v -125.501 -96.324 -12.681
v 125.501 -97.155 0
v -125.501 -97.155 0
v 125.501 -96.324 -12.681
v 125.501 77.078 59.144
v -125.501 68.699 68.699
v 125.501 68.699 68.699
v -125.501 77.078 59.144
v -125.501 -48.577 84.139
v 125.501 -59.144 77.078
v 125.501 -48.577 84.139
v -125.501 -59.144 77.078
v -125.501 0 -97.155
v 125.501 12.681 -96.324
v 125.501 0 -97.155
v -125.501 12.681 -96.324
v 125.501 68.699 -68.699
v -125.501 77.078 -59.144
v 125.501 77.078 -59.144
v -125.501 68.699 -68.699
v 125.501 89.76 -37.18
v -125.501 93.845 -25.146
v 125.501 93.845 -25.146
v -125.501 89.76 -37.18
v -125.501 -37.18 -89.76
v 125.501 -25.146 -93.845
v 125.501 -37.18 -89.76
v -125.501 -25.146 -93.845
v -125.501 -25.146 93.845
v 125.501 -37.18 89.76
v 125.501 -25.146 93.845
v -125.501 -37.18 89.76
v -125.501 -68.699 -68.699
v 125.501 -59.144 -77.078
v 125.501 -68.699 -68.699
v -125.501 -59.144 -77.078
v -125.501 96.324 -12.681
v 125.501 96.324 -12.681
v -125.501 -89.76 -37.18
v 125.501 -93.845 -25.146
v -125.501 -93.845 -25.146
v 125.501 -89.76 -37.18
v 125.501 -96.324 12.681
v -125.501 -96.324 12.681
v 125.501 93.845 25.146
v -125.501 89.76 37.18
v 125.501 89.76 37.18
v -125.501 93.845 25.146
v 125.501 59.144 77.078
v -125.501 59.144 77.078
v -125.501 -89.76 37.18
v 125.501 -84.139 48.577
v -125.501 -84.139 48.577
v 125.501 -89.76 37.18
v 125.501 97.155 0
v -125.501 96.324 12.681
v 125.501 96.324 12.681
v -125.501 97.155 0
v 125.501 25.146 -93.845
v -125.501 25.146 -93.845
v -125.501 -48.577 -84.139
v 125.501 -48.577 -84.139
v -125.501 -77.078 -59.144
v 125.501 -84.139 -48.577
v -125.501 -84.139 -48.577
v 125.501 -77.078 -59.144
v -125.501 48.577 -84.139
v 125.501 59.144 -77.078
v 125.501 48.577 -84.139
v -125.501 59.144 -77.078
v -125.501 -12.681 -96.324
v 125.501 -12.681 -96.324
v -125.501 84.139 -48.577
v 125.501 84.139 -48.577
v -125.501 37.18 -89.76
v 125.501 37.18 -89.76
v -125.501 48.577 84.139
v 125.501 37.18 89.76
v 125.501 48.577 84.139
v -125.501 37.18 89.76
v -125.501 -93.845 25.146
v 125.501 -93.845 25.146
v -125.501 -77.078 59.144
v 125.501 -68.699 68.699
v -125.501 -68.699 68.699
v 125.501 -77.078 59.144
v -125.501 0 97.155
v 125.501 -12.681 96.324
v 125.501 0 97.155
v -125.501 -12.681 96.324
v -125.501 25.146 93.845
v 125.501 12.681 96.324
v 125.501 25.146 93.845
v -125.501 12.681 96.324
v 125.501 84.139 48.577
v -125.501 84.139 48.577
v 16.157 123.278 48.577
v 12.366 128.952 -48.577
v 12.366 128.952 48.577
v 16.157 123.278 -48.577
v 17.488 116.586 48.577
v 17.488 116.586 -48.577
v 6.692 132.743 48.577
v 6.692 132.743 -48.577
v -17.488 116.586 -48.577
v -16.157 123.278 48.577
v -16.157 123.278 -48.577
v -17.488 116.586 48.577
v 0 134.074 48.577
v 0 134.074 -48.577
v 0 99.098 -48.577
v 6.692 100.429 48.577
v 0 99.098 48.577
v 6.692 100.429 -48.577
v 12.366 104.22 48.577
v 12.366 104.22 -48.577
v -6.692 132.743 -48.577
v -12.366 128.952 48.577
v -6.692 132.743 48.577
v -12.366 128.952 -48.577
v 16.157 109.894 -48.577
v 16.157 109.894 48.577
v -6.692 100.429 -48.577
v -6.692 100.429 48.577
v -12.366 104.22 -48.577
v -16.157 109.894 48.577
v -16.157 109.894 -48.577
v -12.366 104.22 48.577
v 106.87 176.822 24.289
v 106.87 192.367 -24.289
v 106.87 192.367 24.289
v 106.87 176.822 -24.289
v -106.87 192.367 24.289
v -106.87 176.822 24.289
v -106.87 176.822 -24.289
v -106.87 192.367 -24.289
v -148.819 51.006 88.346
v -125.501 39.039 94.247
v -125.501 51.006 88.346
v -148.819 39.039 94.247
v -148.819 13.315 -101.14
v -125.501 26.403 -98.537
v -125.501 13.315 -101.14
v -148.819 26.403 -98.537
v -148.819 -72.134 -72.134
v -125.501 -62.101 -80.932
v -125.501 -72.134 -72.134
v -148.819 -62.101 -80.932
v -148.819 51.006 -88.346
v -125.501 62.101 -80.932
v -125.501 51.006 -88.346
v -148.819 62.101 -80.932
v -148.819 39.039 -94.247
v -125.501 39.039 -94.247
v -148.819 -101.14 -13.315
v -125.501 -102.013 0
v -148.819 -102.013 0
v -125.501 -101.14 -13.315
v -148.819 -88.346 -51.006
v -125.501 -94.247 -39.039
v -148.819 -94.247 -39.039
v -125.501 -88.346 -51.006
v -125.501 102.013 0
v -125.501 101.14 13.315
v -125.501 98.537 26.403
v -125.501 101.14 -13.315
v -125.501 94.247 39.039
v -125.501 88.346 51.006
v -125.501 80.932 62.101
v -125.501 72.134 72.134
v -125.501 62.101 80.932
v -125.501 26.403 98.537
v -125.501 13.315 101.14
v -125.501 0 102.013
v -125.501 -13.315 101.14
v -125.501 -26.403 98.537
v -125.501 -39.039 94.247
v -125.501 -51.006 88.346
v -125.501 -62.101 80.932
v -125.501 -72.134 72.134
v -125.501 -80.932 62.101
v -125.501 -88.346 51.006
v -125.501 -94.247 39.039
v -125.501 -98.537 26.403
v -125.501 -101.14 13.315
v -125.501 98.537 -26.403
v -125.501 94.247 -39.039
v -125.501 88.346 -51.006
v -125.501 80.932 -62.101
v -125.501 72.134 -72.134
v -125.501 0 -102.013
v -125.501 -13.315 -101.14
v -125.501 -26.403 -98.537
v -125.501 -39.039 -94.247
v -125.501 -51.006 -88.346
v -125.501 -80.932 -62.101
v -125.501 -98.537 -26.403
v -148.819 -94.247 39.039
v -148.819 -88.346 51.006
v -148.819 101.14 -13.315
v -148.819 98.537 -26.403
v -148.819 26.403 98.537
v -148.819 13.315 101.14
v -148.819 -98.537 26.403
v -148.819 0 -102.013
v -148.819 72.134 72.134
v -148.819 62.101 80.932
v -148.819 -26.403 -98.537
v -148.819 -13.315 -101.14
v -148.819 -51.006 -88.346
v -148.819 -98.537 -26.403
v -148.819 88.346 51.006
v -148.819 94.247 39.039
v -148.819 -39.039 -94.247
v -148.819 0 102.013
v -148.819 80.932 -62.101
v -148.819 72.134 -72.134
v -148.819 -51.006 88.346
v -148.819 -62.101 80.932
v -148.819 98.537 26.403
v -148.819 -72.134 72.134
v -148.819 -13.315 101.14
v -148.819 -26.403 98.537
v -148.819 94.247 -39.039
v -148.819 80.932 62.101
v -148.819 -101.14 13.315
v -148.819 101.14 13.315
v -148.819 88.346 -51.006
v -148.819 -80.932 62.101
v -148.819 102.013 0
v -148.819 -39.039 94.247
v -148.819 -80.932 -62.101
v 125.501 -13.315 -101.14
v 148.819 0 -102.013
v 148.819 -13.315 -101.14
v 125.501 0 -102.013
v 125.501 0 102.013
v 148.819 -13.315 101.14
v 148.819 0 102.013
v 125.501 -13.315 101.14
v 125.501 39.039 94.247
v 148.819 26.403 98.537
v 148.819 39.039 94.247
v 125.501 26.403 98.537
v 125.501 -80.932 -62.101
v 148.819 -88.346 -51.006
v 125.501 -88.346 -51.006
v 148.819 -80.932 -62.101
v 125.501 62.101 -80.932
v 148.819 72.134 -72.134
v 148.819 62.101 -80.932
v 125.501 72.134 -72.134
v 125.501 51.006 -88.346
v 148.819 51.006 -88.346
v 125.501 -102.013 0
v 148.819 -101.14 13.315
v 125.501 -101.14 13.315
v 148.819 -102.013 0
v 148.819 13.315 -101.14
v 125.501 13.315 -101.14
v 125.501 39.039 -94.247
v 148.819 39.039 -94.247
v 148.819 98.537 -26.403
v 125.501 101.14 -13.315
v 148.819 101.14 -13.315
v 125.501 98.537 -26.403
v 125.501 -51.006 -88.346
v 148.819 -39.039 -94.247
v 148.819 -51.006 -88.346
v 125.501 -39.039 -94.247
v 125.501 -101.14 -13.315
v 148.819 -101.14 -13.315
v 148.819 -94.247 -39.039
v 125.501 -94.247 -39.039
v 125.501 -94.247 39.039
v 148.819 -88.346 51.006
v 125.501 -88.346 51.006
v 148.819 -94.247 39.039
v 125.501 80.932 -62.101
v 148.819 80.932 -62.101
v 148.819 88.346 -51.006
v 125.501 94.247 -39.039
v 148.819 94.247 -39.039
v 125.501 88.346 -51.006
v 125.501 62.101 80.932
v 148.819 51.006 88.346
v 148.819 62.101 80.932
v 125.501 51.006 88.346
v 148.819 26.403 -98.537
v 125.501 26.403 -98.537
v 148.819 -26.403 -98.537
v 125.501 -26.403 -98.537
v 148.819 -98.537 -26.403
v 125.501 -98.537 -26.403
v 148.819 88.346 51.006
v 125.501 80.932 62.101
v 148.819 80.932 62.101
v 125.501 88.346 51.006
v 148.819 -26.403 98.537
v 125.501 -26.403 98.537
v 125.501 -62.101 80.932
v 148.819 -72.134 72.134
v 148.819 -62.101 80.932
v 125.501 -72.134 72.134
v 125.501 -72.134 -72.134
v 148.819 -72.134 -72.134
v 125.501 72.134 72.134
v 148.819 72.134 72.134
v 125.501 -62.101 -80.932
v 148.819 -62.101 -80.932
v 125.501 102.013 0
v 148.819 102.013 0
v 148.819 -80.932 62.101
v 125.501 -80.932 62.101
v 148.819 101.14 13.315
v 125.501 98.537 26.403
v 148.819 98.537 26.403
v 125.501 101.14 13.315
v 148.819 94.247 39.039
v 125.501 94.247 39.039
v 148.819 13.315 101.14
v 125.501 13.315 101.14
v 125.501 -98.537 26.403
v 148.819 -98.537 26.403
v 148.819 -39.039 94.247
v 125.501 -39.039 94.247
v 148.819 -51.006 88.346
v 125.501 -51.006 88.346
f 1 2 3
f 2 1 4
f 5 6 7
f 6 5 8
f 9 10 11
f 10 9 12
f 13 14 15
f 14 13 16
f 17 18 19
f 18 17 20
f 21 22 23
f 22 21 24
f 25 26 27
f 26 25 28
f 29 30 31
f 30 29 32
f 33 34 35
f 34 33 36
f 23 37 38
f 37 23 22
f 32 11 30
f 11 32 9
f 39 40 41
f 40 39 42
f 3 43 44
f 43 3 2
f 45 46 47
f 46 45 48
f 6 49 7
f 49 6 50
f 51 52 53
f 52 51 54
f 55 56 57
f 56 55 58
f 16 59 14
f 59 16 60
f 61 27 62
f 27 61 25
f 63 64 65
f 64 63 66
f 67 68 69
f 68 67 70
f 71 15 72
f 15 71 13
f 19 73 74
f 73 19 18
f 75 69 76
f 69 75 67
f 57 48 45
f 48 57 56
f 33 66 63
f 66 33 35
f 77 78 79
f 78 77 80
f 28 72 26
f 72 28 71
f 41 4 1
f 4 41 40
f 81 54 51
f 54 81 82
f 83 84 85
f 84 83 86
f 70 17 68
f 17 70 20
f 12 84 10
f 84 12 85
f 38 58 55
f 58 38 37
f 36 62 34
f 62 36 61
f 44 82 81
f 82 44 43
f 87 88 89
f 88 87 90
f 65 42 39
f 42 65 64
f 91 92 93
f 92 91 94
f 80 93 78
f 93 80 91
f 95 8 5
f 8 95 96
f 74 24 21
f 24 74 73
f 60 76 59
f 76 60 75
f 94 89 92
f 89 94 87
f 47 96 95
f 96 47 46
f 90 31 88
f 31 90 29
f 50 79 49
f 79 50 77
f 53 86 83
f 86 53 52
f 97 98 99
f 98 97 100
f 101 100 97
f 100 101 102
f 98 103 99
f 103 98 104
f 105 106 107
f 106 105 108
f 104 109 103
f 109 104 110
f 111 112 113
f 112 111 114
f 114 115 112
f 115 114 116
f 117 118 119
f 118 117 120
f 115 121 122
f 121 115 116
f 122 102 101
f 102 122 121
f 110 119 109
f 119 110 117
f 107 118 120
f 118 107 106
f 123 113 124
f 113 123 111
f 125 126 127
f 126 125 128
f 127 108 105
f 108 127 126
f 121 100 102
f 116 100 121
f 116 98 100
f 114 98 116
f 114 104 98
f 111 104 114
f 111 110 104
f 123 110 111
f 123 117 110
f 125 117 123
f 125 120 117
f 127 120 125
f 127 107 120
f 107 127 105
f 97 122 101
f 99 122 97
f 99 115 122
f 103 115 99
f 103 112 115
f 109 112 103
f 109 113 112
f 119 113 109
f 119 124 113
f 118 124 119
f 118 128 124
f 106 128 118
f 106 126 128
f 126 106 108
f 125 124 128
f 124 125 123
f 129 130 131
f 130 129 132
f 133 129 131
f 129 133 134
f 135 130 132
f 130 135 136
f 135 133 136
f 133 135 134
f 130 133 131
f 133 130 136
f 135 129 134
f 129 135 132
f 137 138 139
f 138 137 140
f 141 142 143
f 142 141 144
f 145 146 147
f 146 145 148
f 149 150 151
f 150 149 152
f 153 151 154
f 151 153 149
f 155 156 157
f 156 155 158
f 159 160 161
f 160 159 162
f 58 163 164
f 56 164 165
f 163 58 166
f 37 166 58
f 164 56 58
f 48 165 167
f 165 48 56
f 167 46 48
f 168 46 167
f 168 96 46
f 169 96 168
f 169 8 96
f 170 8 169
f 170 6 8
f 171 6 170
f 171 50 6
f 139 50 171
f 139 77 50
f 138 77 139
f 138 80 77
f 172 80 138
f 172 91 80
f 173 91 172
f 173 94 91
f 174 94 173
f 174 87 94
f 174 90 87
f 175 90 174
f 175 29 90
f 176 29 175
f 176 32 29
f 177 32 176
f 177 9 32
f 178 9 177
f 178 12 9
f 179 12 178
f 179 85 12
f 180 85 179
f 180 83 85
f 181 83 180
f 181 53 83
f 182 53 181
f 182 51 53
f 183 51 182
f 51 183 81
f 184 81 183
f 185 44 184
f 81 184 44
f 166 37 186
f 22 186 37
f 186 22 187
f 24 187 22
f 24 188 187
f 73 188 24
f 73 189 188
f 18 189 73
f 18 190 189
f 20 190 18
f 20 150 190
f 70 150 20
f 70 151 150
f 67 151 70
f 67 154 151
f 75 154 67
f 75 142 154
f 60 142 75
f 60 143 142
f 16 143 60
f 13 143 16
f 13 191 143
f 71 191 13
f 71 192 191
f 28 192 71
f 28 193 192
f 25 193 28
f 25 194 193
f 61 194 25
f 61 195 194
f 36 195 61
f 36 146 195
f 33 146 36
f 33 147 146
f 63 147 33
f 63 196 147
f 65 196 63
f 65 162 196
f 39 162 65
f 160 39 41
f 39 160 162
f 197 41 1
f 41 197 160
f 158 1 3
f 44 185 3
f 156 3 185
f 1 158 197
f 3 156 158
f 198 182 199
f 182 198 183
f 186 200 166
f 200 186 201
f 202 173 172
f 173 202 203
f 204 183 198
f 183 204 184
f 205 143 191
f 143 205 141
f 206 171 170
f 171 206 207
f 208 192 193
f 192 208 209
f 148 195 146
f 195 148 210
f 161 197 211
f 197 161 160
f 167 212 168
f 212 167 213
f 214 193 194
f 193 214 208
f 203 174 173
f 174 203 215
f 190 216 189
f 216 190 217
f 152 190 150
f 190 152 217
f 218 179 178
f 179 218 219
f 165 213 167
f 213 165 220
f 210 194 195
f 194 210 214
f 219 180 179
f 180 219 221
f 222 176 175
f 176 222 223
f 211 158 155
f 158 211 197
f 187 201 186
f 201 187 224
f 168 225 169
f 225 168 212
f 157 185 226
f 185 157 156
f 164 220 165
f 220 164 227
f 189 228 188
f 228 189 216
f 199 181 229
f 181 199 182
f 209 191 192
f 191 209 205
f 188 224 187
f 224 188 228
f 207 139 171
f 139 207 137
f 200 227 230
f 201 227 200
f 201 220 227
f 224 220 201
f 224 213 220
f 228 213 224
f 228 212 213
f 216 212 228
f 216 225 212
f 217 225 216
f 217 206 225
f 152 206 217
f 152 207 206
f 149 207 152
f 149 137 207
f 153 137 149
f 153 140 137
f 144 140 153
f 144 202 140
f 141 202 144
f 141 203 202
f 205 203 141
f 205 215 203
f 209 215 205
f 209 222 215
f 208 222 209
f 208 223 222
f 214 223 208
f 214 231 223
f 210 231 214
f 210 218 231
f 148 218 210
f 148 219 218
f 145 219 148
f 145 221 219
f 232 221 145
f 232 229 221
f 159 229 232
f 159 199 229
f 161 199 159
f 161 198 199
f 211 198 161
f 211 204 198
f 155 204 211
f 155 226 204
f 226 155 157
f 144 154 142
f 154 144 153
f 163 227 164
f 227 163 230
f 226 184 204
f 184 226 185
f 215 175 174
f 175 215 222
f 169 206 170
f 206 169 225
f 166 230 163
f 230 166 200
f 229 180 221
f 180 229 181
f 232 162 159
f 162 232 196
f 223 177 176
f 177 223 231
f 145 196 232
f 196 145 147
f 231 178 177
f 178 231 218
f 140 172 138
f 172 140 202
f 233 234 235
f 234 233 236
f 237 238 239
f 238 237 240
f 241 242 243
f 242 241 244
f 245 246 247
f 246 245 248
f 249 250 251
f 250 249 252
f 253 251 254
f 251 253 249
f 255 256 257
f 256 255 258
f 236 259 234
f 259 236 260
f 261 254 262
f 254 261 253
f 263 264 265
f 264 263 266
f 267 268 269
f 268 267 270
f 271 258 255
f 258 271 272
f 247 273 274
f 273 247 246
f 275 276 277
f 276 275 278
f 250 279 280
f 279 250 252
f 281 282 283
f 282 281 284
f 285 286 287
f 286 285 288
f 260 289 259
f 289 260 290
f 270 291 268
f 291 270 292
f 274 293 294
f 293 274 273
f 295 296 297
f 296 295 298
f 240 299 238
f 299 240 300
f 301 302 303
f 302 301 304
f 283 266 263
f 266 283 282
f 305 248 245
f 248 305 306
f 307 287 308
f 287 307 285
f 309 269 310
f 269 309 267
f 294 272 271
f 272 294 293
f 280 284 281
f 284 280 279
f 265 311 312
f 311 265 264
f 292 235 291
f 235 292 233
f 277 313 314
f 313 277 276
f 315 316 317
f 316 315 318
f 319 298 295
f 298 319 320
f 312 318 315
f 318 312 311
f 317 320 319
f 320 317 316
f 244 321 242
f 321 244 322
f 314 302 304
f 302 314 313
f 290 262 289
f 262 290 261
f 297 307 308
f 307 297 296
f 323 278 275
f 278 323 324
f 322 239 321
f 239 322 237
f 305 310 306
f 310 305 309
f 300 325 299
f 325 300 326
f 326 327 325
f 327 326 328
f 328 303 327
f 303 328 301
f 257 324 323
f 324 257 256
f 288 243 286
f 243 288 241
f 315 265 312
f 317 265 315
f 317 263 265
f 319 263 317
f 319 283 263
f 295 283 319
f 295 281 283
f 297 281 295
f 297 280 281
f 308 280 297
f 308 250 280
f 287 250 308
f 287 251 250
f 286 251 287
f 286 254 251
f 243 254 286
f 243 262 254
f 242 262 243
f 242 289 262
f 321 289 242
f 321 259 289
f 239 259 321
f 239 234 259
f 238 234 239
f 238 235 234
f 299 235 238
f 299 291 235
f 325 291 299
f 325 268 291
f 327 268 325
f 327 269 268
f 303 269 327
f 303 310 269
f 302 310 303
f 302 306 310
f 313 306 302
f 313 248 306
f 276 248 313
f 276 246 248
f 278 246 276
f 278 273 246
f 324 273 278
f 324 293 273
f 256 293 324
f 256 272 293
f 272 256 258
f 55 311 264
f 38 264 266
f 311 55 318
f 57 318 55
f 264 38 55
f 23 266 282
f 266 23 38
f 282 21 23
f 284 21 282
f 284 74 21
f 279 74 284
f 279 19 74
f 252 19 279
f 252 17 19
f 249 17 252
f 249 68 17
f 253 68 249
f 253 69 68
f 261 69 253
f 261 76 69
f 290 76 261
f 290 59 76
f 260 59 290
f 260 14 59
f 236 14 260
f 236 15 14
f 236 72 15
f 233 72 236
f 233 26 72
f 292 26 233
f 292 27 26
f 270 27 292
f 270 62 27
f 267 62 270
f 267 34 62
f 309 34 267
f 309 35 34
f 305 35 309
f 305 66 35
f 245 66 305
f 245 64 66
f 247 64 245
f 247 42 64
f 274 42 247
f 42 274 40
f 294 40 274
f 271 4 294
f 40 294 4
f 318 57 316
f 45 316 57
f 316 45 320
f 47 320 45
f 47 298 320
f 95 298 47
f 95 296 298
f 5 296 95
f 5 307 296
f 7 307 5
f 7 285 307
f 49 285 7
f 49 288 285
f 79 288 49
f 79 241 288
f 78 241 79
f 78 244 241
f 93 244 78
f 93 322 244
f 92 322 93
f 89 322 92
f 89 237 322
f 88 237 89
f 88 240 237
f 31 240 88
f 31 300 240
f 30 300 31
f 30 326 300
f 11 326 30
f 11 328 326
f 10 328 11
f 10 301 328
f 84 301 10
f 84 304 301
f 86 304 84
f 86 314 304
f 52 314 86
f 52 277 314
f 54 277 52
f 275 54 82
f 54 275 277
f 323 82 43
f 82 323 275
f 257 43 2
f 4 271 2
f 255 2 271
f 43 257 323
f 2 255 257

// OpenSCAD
// Auto-generated by scripts/author_from_manifest.py (Phase D.3).
// Source: data/phase_d_manifest.json (sku_intent='reliable-model-dv-deluge-4in').
// Do not hand-edit — regenerate from the manifest.
//
// @part reliable_model_dv_deluge_4in
// @kind valve
// @category valve.deluge
// @display-name "Reliable Model DV Deluge Valve 4\""
// @mfg reliable_automatic_sprinkler
// @mfg-pn Model_DV
// @listing UL FM
// @price-usd 1420.00
// @install-minutes 75
// @crew foreman
// @param size_in number default=4 label="Size" unit="in"
// @port inlet position=[-0.05,0,0] direction=[-1,0,0] style=grooved size_in=4 role=run_a
// @port outlet position=[0.05,0,0] direction=[1,0,0] style=grooved size_in=4 role=run_b

size_in = 4.0;

function od_mm(nps) =
    nps ==   1  ? 33.4 :
    nps == 1.25 ? 42.2 :
    nps == 1.5  ? 48.3 :
    nps ==   2  ? 60.3 :
    nps == 2.5  ? 73.0 :
    nps ==   3  ? 88.9 :
    nps ==   4  ? 114.3 :
    nps ==   6  ? 168.3 :
    nps ==   8  ? 219.1 : 73.0;

od = od_mm(size_in);
body_len = od * 2.4;
body_d   = od * 1.7;

union() {
    // Valve body
    rotate([0, 90, 0])
        cylinder(h = body_len, d = body_d, center = true, $fn = 48);
    // Stem / handle indicator
    translate([0, body_d * 0.6, 0])
        cylinder(h = body_d * 0.5, d = body_d * 0.18, center = true, $fn = 16);
    translate([0, body_d * 0.95, 0])
        cube([body_d * 1.1, body_d * 0.08, body_d * 0.25], center = true);
    // End flanges
    translate([-body_len/2, 0, 0])
        rotate([0, 90, 0])
        cylinder(h = body_d * 0.12, d = body_d * 1.05, center = true, $fn = 48);
    translate([ body_len/2, 0, 0])
        rotate([0, 90, 0])
        cylinder(h = body_d * 0.12, d = body_d * 1.05, center = true, $fn = 48);
}
